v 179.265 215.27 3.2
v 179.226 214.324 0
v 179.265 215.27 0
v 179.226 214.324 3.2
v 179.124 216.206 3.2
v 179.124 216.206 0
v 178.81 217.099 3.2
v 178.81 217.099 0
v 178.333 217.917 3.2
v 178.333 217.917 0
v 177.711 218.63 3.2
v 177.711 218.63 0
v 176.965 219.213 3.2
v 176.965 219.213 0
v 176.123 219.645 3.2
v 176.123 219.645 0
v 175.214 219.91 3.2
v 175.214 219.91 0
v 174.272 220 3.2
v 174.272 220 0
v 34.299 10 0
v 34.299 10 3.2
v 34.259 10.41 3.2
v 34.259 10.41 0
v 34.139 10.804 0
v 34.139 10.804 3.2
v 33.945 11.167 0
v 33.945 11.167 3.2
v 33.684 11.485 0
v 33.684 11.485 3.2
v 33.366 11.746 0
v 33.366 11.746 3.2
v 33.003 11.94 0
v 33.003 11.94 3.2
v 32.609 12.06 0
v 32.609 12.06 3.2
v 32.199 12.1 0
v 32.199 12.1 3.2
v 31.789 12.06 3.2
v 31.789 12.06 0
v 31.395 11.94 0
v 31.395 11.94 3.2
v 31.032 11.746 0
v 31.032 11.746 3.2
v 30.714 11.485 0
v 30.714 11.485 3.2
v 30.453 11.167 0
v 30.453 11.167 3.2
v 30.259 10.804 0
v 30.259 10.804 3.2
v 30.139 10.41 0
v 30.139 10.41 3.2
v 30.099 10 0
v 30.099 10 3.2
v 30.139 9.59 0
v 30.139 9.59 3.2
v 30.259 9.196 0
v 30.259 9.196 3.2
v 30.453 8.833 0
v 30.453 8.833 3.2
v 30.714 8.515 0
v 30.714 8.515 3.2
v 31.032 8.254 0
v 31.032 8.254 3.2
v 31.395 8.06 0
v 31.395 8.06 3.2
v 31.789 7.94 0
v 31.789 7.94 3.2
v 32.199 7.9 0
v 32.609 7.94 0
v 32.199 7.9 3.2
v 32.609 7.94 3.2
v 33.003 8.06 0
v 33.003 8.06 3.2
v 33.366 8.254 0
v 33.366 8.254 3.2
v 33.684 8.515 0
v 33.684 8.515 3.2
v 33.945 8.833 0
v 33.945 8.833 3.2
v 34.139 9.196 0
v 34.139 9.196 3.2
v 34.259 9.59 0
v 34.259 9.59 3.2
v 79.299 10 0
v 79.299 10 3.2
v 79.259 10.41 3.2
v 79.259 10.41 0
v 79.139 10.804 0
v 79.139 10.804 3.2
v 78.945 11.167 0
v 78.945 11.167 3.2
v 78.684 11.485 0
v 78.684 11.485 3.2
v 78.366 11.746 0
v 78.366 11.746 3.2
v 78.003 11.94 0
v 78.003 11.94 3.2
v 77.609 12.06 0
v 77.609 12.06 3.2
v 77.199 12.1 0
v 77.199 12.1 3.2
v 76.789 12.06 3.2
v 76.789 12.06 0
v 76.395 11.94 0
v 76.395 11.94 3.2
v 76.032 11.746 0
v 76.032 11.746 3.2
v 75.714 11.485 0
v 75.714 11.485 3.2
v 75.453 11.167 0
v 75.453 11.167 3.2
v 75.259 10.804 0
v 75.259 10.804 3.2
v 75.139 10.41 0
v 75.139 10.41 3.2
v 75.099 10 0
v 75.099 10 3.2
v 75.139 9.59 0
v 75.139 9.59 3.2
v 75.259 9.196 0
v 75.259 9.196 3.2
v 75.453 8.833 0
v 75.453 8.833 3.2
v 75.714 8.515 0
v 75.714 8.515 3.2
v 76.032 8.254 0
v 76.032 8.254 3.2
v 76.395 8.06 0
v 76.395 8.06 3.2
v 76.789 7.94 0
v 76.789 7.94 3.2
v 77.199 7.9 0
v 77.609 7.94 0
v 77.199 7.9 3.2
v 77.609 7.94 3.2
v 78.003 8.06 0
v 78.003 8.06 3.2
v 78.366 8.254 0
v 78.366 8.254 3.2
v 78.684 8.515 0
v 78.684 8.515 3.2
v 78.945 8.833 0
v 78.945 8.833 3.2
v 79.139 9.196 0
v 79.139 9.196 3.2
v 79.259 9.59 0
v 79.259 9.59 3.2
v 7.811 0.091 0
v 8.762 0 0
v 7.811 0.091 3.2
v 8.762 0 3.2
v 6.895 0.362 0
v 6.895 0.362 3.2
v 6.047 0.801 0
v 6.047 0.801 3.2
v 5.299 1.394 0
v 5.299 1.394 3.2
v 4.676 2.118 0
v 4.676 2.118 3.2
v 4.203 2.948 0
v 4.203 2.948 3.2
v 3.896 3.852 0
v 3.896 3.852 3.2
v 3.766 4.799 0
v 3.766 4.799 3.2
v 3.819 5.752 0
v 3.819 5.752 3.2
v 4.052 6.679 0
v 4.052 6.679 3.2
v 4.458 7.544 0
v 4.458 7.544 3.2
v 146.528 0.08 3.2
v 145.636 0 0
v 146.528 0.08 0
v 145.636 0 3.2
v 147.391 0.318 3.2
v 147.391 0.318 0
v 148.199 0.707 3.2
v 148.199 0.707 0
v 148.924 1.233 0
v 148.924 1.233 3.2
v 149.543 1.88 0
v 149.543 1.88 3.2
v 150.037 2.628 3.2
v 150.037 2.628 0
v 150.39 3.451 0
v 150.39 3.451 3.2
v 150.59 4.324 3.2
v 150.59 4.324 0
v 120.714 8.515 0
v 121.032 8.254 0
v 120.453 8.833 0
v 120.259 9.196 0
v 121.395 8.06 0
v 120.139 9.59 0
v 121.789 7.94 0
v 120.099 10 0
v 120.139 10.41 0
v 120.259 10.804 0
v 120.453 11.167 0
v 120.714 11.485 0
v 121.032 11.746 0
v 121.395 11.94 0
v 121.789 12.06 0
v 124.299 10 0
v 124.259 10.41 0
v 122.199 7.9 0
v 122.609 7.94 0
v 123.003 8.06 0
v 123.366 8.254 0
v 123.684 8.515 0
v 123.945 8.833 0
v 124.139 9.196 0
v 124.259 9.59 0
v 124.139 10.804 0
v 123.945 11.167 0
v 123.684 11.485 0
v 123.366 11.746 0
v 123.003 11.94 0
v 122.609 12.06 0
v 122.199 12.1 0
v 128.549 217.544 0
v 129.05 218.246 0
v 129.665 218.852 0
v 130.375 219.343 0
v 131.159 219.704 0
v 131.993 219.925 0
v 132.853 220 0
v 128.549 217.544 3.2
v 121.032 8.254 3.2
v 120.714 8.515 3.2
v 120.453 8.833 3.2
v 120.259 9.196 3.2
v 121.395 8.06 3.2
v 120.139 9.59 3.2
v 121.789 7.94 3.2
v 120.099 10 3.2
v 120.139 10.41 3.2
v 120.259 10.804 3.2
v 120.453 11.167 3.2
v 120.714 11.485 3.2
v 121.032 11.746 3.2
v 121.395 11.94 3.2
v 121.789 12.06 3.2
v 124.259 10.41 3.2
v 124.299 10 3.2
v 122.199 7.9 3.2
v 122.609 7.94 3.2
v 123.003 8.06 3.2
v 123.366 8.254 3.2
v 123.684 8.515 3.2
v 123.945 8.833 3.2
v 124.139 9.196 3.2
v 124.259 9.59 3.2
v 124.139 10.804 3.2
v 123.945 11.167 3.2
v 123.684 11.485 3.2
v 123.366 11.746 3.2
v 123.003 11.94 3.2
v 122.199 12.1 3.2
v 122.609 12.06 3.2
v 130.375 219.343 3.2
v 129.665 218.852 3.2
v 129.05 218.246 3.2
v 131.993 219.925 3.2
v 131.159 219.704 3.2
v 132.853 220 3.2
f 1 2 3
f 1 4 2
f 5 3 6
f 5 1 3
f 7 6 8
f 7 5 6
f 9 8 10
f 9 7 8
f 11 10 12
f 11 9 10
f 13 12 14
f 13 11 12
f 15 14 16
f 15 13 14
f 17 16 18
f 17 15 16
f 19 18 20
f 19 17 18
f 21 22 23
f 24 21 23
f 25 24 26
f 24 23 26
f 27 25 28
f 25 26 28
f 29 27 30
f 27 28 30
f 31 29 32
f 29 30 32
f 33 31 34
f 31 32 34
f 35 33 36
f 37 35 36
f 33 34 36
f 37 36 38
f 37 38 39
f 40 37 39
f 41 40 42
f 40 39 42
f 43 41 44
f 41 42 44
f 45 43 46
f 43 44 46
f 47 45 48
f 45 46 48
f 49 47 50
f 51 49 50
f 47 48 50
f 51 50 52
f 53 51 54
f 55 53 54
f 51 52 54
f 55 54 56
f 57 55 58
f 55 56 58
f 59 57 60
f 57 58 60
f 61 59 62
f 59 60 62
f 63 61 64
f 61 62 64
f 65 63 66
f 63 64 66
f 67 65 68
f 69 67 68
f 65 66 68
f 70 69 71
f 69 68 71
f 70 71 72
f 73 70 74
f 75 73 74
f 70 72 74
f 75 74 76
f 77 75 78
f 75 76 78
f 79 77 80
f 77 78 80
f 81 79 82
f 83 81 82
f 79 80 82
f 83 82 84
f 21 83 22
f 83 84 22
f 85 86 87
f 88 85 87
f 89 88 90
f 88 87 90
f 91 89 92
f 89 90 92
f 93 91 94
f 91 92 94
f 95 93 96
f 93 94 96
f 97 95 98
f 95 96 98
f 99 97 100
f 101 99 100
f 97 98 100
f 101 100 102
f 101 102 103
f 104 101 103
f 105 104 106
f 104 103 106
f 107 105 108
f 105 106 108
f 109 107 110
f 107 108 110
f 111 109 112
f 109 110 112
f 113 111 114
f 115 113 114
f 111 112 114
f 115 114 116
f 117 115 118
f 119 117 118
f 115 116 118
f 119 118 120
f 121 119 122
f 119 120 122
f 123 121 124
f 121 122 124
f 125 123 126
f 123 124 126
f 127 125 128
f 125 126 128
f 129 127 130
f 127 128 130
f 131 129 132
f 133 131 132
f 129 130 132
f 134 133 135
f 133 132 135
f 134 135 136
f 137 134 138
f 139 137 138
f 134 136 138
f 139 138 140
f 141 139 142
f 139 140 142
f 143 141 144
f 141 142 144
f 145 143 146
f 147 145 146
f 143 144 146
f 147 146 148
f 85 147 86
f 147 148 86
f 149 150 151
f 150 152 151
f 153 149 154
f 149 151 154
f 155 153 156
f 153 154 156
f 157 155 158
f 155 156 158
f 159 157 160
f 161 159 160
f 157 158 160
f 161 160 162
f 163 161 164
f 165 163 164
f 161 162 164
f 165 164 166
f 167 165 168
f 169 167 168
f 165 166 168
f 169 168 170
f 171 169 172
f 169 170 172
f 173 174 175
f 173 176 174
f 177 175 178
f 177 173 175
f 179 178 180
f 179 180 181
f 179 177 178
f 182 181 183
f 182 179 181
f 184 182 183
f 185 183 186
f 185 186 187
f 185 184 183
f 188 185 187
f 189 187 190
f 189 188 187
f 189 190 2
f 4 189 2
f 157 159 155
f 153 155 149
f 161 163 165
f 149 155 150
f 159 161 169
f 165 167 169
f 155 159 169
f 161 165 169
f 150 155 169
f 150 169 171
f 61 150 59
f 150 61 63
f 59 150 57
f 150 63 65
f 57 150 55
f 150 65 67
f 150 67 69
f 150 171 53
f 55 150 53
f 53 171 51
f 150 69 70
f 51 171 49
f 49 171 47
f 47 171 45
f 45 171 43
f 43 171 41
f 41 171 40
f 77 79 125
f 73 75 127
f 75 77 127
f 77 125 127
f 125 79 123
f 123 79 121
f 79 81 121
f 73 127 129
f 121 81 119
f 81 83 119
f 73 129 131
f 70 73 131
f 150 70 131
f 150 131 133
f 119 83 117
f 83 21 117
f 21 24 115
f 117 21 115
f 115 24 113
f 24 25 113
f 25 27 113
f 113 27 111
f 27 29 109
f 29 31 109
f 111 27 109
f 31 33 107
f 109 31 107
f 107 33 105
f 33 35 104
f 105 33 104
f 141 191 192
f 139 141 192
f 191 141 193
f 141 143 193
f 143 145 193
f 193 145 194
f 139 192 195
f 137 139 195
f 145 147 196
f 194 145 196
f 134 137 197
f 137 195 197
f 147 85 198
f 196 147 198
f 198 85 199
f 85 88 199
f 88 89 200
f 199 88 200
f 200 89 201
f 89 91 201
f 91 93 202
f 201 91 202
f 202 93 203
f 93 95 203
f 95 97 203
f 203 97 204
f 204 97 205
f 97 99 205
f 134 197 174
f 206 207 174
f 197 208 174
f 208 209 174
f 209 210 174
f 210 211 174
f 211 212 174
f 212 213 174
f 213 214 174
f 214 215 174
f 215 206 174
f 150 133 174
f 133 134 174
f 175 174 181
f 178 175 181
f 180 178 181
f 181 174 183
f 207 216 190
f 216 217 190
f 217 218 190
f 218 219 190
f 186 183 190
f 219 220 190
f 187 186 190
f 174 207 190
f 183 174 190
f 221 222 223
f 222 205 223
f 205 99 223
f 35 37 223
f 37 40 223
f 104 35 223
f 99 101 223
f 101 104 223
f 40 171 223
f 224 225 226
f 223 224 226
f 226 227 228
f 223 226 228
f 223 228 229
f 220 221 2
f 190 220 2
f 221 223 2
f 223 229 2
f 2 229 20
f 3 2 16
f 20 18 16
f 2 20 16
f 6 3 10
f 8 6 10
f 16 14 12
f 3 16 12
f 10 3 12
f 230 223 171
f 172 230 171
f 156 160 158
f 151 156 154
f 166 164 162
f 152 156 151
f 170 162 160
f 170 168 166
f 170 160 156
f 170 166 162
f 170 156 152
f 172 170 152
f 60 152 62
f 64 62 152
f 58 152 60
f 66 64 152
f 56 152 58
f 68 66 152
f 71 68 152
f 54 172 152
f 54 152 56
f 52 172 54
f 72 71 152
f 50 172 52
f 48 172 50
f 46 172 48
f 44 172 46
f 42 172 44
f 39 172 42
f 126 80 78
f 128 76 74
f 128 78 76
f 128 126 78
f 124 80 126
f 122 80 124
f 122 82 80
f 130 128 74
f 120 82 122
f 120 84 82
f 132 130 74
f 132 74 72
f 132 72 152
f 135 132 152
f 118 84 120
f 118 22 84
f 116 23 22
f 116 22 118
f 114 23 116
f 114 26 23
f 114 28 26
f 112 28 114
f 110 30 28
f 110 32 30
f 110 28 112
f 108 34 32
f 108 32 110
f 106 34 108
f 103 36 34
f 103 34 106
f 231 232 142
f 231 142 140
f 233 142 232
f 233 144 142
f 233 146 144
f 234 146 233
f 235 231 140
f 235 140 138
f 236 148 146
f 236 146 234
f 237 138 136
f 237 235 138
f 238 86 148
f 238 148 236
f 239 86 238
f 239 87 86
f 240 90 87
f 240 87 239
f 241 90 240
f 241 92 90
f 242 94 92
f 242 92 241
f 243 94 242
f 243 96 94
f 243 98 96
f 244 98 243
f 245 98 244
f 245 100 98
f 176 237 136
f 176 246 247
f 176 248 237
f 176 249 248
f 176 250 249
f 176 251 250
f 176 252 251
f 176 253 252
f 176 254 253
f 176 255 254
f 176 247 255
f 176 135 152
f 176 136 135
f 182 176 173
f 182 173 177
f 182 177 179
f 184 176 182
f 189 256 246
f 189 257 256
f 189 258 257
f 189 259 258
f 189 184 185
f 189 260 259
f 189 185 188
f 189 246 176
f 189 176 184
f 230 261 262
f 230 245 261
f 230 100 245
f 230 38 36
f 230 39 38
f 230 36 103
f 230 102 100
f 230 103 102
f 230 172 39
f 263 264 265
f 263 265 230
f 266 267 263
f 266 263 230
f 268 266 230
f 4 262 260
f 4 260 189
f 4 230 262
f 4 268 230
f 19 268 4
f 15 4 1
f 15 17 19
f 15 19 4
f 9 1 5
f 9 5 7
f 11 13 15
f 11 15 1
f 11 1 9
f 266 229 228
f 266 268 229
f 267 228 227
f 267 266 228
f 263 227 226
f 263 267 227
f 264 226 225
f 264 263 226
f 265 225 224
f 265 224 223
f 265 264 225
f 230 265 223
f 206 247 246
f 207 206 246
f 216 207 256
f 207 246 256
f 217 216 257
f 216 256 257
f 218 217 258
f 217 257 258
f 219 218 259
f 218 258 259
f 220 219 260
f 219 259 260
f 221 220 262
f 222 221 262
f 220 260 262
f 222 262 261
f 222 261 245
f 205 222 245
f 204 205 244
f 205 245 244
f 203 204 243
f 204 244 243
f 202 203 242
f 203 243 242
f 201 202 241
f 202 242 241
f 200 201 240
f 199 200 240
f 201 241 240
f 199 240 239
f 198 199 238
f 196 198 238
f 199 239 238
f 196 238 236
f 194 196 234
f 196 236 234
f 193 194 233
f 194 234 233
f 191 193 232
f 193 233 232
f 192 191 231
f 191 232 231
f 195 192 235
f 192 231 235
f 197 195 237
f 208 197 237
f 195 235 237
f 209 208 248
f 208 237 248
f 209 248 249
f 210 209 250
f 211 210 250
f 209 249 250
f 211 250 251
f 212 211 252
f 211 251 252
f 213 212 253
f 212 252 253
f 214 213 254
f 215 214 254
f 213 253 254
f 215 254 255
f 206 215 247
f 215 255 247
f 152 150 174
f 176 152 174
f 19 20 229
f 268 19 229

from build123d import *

# Parameters (mm, degrees)
EXTRUDE_1_DEPTH            = 3.2
FILLET_1_R                 = 5
SKETCH_2_R                 = 2.1
CUT_EXTRUDE_1_DEPTH        = 3.2
PATTERN_LINEAR_1_COUNT     = 2
PATTERN_LINEAR_1_PITCH     = 45
PATTERN_LINEAR_1_COL_COUNT = 2
PATTERN_LINEAR_1_COL_PITCH = 45


with BuildPart() as part:
    # Эскиз1 → Бобышка-Вытянуть1 (new body)
    with BuildSketch(Plane.XY):
        Polygon((0, 0), (150, 0), (180, 220), (130, 220), align=None)
    extrude(amount=EXTRUDE_1_DEPTH)

    # Скругление1
    fillet_1_edges = [part.edges().sort_by_distance(p)[0] for p in [
        (130, 220, 1.6),
        (180, 220, 1.6),
        (150, 0, 1.6),
        (0, 0, 1.6),
    ]]
    fillet(fillet_1_edges, radius=FILLET_1_R)

    # Эскиз2 → Вырез-Вытянуть1 (cut)
    with BuildSketch(Plane.XY.offset(3.2)):
        with Locations((77.198893337, 10)):
            Circle(SKETCH_2_R)
    cut_extrude_1 = extrude(amount=-CUT_EXTRUDE_1_DEPTH, mode=Mode.SUBTRACT)

    # Линейный массив1: Вырез-Вытянуть1 ×2
    with Locations(*[(i * PATTERN_LINEAR_1_PITCH, 0, 0) for i in range(1, PATTERN_LINEAR_1_COUNT)]):
        add(cut_extrude_1, mode=Mode.SUBTRACT)

    # Линейный массив1 col: Вырез-Вытянуть1 ×2
    with Locations(*[(-i * PATTERN_LINEAR_1_COL_PITCH, 0, 0) for i in range(1, PATTERN_LINEAR_1_COL_COUNT)]):
        add(cut_extrude_1, mode=Mode.SUBTRACT)


solid = part.part
